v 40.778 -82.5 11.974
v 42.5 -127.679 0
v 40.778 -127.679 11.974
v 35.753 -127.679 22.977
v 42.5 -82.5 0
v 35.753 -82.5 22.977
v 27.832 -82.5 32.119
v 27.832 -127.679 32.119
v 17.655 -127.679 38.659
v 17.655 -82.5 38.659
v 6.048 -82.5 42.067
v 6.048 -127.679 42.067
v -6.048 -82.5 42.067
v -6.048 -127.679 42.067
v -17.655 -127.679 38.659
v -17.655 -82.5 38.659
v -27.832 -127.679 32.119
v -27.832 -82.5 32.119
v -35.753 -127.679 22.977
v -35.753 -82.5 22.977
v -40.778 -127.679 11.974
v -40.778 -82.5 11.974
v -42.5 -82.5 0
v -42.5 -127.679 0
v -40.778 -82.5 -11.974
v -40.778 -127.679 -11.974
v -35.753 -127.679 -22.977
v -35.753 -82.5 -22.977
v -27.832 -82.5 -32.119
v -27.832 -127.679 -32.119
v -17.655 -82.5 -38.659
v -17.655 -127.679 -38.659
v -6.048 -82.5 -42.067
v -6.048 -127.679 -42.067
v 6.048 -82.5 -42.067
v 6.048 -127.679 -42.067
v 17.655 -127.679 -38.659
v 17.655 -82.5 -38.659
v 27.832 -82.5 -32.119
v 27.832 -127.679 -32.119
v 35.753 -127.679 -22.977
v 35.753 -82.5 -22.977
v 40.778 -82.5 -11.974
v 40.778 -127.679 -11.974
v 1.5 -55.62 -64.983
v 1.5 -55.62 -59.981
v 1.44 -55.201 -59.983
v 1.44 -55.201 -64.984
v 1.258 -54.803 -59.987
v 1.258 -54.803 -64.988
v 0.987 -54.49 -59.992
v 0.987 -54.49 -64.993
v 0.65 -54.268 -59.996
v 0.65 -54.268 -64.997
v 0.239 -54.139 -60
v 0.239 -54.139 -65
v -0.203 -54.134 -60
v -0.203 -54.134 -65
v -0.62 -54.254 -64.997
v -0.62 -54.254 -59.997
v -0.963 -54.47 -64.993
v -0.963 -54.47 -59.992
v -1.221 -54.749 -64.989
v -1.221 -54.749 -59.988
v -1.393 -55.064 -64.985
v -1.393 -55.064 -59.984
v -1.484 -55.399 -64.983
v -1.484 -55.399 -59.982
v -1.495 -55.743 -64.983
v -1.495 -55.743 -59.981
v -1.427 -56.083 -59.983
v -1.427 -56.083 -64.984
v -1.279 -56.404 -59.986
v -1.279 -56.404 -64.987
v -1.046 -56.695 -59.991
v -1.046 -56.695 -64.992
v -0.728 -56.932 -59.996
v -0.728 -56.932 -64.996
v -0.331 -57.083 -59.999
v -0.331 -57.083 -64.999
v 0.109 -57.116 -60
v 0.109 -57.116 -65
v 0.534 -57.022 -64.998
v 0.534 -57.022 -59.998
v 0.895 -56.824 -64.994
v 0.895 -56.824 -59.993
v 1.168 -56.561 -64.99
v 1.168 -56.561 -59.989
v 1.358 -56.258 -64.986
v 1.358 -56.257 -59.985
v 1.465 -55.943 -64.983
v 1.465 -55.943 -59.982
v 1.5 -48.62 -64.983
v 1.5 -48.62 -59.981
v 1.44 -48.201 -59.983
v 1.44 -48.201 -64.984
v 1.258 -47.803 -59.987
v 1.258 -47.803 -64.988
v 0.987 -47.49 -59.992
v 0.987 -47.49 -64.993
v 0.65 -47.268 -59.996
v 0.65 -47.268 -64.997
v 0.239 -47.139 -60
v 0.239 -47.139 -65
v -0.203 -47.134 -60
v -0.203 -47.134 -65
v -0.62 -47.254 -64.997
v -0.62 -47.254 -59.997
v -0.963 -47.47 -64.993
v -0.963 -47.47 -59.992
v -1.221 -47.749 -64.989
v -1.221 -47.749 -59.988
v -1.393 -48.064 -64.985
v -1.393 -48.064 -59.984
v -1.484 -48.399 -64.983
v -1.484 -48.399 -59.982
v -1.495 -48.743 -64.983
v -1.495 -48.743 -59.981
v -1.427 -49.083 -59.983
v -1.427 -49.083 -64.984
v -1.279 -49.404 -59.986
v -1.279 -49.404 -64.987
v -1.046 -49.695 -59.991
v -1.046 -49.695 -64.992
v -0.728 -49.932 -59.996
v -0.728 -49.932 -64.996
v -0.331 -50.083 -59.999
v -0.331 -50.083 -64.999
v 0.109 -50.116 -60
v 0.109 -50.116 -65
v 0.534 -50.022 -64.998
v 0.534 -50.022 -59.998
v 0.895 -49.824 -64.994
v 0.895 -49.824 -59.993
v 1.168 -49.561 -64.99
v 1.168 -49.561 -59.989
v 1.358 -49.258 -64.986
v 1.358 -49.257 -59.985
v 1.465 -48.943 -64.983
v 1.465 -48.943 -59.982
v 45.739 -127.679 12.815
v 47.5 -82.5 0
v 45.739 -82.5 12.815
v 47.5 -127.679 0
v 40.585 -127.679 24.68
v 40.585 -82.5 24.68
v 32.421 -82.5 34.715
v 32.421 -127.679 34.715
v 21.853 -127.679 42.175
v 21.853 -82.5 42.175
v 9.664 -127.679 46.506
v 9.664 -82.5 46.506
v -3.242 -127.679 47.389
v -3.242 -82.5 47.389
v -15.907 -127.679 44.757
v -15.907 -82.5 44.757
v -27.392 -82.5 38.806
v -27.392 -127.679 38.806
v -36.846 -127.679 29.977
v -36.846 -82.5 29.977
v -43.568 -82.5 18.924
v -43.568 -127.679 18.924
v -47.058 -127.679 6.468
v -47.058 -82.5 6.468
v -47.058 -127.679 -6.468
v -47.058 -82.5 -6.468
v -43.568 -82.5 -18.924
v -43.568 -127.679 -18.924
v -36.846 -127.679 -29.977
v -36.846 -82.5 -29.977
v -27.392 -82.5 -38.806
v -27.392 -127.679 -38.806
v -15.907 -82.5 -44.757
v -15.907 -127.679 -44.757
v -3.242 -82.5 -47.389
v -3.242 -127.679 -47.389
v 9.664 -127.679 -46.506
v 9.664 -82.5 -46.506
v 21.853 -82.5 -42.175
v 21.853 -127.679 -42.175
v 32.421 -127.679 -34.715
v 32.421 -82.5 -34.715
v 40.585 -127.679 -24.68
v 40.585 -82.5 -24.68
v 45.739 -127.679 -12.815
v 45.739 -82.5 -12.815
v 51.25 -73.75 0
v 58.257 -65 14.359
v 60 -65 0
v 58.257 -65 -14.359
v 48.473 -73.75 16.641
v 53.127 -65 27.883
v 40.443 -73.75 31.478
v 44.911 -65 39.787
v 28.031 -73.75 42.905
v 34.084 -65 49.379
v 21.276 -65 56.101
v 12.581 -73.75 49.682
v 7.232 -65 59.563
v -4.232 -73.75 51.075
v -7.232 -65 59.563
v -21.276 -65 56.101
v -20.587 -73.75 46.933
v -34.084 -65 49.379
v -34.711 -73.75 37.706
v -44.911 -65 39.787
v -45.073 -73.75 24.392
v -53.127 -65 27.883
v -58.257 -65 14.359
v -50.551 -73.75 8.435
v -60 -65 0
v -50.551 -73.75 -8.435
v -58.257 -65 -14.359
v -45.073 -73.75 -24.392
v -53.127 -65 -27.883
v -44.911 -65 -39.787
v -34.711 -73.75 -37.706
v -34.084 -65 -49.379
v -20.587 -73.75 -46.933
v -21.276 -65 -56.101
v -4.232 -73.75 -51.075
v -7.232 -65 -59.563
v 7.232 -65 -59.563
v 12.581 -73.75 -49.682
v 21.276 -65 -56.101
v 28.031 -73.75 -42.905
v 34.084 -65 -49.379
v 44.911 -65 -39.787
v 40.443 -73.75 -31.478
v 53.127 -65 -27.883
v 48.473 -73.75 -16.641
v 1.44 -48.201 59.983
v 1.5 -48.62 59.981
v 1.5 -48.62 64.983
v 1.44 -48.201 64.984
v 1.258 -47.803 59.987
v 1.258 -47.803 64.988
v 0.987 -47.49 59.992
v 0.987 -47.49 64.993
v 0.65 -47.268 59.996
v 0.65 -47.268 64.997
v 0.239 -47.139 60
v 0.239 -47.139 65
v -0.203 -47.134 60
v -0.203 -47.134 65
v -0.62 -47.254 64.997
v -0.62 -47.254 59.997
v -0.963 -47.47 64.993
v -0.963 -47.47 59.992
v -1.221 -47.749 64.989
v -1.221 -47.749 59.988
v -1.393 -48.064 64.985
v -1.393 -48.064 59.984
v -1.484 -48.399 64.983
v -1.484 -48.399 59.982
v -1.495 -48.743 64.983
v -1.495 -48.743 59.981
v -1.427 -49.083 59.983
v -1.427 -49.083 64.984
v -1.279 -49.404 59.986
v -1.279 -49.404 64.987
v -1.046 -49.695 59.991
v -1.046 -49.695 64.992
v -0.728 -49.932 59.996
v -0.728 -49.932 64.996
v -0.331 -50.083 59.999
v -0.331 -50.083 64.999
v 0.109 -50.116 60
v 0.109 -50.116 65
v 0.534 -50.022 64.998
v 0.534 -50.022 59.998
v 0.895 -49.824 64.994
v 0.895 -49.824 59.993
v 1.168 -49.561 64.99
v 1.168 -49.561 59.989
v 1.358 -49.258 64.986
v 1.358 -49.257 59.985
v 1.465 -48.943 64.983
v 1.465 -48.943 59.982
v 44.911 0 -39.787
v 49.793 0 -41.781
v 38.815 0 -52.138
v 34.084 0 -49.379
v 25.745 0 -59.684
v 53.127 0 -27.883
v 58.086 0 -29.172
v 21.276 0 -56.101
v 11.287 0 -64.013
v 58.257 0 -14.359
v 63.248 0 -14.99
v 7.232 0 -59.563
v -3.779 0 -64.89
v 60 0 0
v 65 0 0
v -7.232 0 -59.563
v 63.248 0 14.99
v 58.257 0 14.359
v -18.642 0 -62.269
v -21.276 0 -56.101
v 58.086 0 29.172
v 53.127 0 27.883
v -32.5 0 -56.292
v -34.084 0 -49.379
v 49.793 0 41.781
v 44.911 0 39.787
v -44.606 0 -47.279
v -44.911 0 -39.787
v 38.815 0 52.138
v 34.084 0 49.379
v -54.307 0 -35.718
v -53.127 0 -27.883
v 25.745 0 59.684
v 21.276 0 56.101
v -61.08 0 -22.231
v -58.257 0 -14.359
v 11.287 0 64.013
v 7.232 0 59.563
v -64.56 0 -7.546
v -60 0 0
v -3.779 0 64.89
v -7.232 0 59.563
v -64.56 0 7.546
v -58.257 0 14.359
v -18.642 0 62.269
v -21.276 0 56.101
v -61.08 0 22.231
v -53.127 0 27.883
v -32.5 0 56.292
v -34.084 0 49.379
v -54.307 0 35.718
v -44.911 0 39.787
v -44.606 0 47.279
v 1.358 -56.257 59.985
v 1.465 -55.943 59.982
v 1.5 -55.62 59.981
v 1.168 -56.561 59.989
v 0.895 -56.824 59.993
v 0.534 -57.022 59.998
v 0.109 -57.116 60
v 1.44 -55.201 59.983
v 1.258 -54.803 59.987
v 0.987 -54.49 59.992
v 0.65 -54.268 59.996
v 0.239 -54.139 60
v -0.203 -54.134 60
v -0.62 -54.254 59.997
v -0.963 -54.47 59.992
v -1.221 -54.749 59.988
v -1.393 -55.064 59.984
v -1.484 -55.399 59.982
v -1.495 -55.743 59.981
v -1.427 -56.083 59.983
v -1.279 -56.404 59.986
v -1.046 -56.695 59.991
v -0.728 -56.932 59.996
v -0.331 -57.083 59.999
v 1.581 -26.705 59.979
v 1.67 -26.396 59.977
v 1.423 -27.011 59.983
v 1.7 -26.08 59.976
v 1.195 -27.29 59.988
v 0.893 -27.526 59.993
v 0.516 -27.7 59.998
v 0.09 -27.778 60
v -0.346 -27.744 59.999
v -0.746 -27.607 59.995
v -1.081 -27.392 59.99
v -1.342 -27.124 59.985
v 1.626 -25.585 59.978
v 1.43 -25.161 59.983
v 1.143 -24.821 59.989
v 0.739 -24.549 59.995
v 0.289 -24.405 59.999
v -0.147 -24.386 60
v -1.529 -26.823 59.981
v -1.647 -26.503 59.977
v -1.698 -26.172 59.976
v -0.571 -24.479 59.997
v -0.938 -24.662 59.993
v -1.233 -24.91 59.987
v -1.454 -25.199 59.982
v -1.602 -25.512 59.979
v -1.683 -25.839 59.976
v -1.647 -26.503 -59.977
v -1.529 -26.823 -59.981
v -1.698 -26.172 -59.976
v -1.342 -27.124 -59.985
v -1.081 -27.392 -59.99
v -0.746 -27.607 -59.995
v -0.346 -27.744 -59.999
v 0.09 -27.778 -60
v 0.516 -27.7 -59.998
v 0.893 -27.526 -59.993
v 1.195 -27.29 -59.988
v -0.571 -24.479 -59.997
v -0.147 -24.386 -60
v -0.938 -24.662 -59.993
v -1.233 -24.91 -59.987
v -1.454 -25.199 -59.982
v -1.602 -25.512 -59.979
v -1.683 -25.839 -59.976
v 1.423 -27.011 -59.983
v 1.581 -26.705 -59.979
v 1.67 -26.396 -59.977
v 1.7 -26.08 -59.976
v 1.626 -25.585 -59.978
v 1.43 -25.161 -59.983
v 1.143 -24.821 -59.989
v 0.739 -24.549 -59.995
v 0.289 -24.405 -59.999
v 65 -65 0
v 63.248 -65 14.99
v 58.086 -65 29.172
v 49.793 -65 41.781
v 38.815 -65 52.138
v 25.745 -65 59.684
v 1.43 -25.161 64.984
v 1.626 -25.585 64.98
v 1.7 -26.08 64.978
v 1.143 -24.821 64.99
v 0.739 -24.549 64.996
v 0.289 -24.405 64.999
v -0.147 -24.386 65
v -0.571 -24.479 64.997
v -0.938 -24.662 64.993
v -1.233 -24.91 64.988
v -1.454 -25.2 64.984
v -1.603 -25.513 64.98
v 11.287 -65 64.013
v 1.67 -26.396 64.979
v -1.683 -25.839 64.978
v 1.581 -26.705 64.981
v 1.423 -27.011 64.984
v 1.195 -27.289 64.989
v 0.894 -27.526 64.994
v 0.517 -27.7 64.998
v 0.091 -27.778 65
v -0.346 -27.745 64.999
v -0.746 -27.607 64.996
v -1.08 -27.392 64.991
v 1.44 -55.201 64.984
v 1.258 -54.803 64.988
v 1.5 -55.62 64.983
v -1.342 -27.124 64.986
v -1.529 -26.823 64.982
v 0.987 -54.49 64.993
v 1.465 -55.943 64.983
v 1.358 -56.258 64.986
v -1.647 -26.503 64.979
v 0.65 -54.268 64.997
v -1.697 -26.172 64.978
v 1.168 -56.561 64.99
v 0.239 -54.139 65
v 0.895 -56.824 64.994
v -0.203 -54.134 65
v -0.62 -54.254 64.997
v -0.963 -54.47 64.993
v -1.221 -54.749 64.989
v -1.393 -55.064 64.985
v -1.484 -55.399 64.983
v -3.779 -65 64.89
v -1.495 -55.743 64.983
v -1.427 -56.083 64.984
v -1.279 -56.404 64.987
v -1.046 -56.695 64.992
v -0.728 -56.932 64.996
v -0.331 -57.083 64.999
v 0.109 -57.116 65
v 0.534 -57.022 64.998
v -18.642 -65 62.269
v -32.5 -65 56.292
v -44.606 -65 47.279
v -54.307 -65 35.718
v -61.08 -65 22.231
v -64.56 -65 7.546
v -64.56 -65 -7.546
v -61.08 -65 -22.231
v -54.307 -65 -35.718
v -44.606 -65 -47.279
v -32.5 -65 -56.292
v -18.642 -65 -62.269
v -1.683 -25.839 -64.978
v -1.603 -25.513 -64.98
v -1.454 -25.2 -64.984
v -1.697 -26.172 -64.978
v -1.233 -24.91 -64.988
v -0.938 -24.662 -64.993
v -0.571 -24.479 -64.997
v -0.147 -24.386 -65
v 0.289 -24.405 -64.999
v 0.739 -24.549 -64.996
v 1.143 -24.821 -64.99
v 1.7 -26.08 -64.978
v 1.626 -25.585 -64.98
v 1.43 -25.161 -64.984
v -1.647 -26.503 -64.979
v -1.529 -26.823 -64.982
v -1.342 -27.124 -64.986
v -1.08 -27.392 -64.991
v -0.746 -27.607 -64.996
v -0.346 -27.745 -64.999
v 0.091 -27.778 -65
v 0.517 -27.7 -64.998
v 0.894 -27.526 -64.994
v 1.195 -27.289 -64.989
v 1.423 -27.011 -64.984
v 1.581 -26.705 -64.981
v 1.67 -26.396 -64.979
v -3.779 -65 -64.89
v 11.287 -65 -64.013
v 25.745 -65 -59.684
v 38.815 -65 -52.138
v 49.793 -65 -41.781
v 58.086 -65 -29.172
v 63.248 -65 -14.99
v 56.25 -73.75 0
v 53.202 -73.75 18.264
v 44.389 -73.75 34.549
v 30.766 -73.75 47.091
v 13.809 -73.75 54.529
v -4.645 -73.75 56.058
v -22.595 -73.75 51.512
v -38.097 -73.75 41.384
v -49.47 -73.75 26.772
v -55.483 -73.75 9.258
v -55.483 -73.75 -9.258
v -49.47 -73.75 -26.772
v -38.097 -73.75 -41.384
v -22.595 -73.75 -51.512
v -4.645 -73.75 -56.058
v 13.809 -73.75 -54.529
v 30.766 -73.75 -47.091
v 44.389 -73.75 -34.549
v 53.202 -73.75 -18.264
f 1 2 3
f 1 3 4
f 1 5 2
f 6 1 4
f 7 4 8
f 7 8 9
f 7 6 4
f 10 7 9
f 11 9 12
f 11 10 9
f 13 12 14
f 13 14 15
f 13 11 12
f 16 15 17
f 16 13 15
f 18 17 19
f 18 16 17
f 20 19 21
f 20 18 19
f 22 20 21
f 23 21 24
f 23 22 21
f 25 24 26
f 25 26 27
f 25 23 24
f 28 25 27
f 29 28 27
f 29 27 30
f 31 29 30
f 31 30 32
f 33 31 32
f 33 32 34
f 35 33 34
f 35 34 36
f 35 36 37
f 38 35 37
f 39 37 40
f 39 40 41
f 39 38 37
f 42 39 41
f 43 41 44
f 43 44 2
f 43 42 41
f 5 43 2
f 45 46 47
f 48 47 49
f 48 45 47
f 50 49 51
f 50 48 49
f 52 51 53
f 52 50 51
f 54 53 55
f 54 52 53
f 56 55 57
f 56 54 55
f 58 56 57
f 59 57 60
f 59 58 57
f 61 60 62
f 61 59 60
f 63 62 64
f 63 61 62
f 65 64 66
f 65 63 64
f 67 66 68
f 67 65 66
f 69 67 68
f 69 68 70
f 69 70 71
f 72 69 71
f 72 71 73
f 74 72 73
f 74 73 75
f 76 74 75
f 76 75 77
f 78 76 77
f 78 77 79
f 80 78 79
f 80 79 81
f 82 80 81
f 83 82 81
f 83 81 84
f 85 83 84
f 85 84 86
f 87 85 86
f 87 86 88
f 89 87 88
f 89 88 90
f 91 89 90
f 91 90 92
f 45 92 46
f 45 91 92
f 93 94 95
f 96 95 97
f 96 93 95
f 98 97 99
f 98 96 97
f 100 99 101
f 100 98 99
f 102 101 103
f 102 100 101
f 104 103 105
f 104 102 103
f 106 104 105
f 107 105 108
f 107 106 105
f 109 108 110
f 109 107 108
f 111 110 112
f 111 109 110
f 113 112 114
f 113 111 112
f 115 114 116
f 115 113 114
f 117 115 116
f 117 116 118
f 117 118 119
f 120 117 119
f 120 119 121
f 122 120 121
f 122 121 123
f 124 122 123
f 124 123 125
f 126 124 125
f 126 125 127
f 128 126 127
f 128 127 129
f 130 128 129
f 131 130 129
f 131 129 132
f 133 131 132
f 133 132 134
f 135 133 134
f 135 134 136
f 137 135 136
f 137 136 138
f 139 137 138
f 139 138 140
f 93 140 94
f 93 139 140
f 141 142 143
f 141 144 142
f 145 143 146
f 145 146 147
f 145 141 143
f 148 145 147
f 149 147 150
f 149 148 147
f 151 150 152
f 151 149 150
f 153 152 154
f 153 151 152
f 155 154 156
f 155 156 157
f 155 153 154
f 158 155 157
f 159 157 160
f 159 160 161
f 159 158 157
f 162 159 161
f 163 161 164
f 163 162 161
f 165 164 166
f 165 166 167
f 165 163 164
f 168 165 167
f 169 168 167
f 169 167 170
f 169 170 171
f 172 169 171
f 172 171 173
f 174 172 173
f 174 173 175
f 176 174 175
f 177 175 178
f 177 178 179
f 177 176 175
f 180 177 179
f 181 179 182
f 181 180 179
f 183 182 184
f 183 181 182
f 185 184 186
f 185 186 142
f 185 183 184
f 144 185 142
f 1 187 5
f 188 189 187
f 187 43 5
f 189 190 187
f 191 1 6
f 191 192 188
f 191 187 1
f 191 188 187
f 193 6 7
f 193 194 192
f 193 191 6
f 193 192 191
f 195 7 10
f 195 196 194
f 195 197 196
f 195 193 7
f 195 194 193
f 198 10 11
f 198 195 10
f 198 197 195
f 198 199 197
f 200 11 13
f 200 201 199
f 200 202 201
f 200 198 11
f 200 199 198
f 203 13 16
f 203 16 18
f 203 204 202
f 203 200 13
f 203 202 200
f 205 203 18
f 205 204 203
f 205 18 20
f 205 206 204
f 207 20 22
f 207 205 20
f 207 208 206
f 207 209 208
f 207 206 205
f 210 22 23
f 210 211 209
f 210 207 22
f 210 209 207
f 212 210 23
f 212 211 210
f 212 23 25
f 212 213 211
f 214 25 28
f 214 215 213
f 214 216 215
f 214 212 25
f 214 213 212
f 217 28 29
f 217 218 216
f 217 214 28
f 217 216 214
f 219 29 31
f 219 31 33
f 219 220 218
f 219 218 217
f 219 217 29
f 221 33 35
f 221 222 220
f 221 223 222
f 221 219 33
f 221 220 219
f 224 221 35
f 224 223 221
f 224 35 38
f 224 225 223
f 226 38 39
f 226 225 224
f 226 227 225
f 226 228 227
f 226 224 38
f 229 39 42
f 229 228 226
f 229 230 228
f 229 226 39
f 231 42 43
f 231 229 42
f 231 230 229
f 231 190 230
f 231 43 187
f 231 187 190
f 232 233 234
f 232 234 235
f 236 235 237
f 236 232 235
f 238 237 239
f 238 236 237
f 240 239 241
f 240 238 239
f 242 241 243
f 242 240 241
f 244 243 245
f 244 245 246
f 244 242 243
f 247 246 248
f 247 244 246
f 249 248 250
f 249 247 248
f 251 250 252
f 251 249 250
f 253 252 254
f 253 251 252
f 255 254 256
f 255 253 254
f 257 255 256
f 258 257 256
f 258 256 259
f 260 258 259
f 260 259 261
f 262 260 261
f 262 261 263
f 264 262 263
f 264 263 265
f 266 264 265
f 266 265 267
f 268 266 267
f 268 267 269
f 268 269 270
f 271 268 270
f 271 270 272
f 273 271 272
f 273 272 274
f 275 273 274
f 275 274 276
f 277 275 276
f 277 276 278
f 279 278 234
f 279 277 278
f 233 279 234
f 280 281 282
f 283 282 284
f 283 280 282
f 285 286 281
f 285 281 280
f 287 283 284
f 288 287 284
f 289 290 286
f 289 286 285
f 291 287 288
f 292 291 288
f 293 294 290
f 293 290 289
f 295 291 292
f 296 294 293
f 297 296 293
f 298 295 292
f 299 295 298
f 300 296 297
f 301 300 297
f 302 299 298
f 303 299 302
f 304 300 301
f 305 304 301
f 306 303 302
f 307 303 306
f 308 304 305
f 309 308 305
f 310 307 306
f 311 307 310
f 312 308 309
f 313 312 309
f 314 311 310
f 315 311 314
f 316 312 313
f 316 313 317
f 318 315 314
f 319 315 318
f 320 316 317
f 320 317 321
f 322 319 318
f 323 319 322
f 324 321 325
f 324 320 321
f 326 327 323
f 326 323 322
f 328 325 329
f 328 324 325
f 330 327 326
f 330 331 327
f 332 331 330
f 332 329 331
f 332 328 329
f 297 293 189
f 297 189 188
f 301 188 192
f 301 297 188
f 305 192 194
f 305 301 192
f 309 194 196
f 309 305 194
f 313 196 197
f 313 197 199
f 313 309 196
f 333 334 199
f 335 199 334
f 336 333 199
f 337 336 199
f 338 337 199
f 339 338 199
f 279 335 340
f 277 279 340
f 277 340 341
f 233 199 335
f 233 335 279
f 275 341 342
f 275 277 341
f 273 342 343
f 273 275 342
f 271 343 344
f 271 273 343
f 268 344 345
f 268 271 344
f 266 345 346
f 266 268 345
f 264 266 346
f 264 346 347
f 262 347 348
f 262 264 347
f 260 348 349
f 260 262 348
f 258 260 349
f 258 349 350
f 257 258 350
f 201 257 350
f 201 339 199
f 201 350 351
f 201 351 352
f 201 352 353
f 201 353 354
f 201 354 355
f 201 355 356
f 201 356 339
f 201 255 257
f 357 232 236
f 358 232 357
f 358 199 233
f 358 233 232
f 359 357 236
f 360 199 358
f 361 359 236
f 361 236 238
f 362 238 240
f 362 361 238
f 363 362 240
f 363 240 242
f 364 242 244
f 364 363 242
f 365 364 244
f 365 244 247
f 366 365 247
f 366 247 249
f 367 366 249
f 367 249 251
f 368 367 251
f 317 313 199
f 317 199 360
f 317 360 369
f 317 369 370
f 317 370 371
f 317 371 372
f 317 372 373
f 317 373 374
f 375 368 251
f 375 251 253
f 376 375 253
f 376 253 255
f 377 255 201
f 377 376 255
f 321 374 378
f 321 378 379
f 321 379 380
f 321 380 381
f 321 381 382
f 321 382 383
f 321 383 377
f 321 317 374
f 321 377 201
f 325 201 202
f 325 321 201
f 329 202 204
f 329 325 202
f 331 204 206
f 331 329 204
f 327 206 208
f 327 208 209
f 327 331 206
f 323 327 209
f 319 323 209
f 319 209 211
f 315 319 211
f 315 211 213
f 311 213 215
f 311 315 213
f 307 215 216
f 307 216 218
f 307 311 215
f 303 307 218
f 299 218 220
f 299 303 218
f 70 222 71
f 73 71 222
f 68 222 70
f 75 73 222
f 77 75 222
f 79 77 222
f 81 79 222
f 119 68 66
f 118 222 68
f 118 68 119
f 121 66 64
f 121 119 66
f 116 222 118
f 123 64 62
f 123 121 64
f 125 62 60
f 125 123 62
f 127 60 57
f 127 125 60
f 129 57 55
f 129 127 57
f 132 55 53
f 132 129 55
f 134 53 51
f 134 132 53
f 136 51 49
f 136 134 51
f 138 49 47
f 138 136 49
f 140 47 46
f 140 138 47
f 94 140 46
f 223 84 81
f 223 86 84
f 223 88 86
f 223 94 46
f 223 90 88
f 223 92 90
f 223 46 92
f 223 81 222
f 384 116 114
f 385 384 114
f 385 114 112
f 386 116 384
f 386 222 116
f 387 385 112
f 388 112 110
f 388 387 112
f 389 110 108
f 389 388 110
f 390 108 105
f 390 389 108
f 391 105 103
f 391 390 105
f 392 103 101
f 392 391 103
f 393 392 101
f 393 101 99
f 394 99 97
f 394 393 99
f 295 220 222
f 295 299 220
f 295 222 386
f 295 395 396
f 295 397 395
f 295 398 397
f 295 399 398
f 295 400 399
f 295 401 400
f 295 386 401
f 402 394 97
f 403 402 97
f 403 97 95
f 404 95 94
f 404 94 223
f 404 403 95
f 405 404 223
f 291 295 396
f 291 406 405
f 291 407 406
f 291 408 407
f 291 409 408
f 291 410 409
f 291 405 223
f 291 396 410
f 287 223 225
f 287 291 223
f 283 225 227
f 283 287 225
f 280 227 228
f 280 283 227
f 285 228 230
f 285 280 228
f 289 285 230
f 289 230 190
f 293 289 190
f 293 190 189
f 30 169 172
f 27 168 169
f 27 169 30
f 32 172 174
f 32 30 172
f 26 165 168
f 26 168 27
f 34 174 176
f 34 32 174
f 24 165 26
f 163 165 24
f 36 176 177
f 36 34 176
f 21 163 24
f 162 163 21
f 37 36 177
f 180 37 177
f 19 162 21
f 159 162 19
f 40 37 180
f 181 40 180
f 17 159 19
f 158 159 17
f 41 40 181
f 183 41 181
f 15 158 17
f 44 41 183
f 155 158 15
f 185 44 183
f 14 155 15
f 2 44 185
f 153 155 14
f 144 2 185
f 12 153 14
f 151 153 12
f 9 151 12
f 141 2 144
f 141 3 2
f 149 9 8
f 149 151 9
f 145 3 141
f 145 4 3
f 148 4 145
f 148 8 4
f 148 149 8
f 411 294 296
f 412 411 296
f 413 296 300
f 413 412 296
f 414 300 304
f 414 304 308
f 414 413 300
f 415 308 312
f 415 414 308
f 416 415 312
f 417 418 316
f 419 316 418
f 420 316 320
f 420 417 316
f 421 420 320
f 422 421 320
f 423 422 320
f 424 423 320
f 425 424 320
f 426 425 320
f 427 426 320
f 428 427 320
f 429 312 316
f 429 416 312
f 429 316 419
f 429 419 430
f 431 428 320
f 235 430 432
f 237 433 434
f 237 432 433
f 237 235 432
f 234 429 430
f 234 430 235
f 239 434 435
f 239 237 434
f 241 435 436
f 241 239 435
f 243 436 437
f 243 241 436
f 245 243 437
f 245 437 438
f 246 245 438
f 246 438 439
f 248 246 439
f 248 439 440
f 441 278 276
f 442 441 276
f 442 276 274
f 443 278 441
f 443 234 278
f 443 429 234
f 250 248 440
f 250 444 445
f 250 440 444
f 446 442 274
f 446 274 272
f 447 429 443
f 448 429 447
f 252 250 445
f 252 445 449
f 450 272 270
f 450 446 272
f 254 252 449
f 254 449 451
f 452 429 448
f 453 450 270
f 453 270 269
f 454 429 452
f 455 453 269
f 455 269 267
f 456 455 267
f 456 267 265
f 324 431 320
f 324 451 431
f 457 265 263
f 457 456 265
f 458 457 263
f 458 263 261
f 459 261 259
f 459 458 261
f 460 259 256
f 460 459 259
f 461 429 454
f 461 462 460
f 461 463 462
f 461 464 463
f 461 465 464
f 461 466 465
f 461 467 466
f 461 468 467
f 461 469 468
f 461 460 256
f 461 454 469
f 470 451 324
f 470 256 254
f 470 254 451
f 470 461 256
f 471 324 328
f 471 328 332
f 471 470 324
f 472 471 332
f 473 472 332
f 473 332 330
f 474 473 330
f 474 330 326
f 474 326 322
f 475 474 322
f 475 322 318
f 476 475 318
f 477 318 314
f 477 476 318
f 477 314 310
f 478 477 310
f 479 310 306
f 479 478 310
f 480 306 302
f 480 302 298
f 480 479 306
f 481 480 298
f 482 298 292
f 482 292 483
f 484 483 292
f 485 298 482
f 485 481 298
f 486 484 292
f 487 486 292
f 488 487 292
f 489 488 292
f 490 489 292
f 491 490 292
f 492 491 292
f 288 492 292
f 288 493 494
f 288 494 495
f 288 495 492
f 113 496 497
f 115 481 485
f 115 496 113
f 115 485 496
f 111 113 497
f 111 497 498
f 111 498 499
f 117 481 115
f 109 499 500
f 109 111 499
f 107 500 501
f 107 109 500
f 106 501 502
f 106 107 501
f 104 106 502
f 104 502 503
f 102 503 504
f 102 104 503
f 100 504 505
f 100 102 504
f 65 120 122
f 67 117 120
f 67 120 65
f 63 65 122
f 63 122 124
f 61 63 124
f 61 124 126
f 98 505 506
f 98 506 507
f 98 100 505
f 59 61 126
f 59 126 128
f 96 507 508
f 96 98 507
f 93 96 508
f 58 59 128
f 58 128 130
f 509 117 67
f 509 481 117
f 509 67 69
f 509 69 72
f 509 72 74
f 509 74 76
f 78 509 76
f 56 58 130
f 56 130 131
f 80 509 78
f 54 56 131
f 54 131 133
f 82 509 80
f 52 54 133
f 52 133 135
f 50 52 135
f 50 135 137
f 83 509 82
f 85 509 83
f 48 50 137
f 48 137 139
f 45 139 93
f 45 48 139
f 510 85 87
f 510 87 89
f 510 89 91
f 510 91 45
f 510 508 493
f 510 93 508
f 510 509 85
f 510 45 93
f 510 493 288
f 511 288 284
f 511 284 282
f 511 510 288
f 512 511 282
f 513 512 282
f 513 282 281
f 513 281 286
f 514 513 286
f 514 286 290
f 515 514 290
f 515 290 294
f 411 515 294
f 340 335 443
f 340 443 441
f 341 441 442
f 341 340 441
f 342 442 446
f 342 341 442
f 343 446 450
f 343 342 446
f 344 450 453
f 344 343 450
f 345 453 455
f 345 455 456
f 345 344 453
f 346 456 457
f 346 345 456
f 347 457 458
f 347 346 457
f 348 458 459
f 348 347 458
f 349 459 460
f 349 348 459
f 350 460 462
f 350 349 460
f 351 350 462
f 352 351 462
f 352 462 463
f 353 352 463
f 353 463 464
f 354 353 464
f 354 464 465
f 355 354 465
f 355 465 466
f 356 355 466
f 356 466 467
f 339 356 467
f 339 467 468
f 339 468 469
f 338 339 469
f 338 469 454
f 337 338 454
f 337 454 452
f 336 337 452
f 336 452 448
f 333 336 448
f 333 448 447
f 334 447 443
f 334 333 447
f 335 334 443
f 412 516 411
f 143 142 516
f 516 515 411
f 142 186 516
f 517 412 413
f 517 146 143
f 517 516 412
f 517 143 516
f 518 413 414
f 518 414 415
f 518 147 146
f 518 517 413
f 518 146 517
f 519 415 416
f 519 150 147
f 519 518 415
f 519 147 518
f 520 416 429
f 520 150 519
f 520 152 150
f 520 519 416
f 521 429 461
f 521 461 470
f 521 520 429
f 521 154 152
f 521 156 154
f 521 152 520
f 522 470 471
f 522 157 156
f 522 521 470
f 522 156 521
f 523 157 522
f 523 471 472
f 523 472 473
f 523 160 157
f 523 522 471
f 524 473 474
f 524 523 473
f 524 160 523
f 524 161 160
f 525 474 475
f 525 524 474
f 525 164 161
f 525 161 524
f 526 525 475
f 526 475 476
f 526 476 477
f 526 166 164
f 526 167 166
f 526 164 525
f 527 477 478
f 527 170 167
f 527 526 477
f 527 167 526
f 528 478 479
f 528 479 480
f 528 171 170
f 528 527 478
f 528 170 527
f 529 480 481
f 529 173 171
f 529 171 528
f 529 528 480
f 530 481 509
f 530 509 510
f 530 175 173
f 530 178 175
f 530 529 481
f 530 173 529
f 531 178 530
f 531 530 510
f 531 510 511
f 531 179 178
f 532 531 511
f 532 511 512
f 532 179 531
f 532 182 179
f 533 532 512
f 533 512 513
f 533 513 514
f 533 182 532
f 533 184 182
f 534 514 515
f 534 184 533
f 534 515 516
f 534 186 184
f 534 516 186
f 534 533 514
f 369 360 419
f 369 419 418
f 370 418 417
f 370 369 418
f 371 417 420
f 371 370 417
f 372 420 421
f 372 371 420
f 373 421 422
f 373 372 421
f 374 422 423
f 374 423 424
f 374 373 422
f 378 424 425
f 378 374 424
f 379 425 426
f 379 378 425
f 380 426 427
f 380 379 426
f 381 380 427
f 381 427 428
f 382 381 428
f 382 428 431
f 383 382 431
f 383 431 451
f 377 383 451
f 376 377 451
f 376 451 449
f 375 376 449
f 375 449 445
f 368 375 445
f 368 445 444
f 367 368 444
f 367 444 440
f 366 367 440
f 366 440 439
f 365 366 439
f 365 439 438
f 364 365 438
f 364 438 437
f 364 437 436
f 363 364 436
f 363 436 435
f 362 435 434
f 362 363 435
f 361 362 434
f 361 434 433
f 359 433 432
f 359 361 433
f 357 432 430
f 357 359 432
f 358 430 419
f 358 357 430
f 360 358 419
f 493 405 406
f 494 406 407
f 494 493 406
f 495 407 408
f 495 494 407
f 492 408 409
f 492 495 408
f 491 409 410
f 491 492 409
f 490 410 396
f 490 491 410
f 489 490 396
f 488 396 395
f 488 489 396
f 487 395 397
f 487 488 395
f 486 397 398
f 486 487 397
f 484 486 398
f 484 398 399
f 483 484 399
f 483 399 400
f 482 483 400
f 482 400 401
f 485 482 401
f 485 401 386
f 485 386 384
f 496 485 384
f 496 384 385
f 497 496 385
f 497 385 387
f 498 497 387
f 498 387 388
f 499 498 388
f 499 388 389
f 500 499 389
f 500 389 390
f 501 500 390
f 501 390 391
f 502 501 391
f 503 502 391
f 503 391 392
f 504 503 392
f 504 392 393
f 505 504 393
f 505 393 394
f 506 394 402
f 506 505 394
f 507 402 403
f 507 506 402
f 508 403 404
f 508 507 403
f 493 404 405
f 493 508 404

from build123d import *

# Parameters (mm, degrees)
SKETCH7_R          = 1.5
SKETCH7_R_2        = 1.7
CUT_EXTRUDE2_DEPTH = 131


with BuildPart() as part:
    # Sketch1 → Revolve1 (revolve)
    with BuildSketch(Plane.XY):
        Polygon((65, -65), (47.5, -82.5), (47.5, -127.679491924), (42.5, -127.679491924), (42.5, -82.5), (60, -65), (60, 0), (65, 0), align=None)
    revolve(axis=Axis((0, 0, 0), (0, -1, 0)))

    # Sketch7 → Cut-Extrude2 (cut, through all)
    with BuildSketch(Plane.XY.offset(-65)):
        with Locations((0, -48.62)):
            Circle(SKETCH7_R)
        with Locations((0, -55.62)):
            Circle(SKETCH7_R)
        with Locations((0, -26.08)):
            Circle(SKETCH7_R_2)
    extrude(amount=CUT_EXTRUDE2_DEPTH, mode=Mode.SUBTRACT)


solid = part.part
